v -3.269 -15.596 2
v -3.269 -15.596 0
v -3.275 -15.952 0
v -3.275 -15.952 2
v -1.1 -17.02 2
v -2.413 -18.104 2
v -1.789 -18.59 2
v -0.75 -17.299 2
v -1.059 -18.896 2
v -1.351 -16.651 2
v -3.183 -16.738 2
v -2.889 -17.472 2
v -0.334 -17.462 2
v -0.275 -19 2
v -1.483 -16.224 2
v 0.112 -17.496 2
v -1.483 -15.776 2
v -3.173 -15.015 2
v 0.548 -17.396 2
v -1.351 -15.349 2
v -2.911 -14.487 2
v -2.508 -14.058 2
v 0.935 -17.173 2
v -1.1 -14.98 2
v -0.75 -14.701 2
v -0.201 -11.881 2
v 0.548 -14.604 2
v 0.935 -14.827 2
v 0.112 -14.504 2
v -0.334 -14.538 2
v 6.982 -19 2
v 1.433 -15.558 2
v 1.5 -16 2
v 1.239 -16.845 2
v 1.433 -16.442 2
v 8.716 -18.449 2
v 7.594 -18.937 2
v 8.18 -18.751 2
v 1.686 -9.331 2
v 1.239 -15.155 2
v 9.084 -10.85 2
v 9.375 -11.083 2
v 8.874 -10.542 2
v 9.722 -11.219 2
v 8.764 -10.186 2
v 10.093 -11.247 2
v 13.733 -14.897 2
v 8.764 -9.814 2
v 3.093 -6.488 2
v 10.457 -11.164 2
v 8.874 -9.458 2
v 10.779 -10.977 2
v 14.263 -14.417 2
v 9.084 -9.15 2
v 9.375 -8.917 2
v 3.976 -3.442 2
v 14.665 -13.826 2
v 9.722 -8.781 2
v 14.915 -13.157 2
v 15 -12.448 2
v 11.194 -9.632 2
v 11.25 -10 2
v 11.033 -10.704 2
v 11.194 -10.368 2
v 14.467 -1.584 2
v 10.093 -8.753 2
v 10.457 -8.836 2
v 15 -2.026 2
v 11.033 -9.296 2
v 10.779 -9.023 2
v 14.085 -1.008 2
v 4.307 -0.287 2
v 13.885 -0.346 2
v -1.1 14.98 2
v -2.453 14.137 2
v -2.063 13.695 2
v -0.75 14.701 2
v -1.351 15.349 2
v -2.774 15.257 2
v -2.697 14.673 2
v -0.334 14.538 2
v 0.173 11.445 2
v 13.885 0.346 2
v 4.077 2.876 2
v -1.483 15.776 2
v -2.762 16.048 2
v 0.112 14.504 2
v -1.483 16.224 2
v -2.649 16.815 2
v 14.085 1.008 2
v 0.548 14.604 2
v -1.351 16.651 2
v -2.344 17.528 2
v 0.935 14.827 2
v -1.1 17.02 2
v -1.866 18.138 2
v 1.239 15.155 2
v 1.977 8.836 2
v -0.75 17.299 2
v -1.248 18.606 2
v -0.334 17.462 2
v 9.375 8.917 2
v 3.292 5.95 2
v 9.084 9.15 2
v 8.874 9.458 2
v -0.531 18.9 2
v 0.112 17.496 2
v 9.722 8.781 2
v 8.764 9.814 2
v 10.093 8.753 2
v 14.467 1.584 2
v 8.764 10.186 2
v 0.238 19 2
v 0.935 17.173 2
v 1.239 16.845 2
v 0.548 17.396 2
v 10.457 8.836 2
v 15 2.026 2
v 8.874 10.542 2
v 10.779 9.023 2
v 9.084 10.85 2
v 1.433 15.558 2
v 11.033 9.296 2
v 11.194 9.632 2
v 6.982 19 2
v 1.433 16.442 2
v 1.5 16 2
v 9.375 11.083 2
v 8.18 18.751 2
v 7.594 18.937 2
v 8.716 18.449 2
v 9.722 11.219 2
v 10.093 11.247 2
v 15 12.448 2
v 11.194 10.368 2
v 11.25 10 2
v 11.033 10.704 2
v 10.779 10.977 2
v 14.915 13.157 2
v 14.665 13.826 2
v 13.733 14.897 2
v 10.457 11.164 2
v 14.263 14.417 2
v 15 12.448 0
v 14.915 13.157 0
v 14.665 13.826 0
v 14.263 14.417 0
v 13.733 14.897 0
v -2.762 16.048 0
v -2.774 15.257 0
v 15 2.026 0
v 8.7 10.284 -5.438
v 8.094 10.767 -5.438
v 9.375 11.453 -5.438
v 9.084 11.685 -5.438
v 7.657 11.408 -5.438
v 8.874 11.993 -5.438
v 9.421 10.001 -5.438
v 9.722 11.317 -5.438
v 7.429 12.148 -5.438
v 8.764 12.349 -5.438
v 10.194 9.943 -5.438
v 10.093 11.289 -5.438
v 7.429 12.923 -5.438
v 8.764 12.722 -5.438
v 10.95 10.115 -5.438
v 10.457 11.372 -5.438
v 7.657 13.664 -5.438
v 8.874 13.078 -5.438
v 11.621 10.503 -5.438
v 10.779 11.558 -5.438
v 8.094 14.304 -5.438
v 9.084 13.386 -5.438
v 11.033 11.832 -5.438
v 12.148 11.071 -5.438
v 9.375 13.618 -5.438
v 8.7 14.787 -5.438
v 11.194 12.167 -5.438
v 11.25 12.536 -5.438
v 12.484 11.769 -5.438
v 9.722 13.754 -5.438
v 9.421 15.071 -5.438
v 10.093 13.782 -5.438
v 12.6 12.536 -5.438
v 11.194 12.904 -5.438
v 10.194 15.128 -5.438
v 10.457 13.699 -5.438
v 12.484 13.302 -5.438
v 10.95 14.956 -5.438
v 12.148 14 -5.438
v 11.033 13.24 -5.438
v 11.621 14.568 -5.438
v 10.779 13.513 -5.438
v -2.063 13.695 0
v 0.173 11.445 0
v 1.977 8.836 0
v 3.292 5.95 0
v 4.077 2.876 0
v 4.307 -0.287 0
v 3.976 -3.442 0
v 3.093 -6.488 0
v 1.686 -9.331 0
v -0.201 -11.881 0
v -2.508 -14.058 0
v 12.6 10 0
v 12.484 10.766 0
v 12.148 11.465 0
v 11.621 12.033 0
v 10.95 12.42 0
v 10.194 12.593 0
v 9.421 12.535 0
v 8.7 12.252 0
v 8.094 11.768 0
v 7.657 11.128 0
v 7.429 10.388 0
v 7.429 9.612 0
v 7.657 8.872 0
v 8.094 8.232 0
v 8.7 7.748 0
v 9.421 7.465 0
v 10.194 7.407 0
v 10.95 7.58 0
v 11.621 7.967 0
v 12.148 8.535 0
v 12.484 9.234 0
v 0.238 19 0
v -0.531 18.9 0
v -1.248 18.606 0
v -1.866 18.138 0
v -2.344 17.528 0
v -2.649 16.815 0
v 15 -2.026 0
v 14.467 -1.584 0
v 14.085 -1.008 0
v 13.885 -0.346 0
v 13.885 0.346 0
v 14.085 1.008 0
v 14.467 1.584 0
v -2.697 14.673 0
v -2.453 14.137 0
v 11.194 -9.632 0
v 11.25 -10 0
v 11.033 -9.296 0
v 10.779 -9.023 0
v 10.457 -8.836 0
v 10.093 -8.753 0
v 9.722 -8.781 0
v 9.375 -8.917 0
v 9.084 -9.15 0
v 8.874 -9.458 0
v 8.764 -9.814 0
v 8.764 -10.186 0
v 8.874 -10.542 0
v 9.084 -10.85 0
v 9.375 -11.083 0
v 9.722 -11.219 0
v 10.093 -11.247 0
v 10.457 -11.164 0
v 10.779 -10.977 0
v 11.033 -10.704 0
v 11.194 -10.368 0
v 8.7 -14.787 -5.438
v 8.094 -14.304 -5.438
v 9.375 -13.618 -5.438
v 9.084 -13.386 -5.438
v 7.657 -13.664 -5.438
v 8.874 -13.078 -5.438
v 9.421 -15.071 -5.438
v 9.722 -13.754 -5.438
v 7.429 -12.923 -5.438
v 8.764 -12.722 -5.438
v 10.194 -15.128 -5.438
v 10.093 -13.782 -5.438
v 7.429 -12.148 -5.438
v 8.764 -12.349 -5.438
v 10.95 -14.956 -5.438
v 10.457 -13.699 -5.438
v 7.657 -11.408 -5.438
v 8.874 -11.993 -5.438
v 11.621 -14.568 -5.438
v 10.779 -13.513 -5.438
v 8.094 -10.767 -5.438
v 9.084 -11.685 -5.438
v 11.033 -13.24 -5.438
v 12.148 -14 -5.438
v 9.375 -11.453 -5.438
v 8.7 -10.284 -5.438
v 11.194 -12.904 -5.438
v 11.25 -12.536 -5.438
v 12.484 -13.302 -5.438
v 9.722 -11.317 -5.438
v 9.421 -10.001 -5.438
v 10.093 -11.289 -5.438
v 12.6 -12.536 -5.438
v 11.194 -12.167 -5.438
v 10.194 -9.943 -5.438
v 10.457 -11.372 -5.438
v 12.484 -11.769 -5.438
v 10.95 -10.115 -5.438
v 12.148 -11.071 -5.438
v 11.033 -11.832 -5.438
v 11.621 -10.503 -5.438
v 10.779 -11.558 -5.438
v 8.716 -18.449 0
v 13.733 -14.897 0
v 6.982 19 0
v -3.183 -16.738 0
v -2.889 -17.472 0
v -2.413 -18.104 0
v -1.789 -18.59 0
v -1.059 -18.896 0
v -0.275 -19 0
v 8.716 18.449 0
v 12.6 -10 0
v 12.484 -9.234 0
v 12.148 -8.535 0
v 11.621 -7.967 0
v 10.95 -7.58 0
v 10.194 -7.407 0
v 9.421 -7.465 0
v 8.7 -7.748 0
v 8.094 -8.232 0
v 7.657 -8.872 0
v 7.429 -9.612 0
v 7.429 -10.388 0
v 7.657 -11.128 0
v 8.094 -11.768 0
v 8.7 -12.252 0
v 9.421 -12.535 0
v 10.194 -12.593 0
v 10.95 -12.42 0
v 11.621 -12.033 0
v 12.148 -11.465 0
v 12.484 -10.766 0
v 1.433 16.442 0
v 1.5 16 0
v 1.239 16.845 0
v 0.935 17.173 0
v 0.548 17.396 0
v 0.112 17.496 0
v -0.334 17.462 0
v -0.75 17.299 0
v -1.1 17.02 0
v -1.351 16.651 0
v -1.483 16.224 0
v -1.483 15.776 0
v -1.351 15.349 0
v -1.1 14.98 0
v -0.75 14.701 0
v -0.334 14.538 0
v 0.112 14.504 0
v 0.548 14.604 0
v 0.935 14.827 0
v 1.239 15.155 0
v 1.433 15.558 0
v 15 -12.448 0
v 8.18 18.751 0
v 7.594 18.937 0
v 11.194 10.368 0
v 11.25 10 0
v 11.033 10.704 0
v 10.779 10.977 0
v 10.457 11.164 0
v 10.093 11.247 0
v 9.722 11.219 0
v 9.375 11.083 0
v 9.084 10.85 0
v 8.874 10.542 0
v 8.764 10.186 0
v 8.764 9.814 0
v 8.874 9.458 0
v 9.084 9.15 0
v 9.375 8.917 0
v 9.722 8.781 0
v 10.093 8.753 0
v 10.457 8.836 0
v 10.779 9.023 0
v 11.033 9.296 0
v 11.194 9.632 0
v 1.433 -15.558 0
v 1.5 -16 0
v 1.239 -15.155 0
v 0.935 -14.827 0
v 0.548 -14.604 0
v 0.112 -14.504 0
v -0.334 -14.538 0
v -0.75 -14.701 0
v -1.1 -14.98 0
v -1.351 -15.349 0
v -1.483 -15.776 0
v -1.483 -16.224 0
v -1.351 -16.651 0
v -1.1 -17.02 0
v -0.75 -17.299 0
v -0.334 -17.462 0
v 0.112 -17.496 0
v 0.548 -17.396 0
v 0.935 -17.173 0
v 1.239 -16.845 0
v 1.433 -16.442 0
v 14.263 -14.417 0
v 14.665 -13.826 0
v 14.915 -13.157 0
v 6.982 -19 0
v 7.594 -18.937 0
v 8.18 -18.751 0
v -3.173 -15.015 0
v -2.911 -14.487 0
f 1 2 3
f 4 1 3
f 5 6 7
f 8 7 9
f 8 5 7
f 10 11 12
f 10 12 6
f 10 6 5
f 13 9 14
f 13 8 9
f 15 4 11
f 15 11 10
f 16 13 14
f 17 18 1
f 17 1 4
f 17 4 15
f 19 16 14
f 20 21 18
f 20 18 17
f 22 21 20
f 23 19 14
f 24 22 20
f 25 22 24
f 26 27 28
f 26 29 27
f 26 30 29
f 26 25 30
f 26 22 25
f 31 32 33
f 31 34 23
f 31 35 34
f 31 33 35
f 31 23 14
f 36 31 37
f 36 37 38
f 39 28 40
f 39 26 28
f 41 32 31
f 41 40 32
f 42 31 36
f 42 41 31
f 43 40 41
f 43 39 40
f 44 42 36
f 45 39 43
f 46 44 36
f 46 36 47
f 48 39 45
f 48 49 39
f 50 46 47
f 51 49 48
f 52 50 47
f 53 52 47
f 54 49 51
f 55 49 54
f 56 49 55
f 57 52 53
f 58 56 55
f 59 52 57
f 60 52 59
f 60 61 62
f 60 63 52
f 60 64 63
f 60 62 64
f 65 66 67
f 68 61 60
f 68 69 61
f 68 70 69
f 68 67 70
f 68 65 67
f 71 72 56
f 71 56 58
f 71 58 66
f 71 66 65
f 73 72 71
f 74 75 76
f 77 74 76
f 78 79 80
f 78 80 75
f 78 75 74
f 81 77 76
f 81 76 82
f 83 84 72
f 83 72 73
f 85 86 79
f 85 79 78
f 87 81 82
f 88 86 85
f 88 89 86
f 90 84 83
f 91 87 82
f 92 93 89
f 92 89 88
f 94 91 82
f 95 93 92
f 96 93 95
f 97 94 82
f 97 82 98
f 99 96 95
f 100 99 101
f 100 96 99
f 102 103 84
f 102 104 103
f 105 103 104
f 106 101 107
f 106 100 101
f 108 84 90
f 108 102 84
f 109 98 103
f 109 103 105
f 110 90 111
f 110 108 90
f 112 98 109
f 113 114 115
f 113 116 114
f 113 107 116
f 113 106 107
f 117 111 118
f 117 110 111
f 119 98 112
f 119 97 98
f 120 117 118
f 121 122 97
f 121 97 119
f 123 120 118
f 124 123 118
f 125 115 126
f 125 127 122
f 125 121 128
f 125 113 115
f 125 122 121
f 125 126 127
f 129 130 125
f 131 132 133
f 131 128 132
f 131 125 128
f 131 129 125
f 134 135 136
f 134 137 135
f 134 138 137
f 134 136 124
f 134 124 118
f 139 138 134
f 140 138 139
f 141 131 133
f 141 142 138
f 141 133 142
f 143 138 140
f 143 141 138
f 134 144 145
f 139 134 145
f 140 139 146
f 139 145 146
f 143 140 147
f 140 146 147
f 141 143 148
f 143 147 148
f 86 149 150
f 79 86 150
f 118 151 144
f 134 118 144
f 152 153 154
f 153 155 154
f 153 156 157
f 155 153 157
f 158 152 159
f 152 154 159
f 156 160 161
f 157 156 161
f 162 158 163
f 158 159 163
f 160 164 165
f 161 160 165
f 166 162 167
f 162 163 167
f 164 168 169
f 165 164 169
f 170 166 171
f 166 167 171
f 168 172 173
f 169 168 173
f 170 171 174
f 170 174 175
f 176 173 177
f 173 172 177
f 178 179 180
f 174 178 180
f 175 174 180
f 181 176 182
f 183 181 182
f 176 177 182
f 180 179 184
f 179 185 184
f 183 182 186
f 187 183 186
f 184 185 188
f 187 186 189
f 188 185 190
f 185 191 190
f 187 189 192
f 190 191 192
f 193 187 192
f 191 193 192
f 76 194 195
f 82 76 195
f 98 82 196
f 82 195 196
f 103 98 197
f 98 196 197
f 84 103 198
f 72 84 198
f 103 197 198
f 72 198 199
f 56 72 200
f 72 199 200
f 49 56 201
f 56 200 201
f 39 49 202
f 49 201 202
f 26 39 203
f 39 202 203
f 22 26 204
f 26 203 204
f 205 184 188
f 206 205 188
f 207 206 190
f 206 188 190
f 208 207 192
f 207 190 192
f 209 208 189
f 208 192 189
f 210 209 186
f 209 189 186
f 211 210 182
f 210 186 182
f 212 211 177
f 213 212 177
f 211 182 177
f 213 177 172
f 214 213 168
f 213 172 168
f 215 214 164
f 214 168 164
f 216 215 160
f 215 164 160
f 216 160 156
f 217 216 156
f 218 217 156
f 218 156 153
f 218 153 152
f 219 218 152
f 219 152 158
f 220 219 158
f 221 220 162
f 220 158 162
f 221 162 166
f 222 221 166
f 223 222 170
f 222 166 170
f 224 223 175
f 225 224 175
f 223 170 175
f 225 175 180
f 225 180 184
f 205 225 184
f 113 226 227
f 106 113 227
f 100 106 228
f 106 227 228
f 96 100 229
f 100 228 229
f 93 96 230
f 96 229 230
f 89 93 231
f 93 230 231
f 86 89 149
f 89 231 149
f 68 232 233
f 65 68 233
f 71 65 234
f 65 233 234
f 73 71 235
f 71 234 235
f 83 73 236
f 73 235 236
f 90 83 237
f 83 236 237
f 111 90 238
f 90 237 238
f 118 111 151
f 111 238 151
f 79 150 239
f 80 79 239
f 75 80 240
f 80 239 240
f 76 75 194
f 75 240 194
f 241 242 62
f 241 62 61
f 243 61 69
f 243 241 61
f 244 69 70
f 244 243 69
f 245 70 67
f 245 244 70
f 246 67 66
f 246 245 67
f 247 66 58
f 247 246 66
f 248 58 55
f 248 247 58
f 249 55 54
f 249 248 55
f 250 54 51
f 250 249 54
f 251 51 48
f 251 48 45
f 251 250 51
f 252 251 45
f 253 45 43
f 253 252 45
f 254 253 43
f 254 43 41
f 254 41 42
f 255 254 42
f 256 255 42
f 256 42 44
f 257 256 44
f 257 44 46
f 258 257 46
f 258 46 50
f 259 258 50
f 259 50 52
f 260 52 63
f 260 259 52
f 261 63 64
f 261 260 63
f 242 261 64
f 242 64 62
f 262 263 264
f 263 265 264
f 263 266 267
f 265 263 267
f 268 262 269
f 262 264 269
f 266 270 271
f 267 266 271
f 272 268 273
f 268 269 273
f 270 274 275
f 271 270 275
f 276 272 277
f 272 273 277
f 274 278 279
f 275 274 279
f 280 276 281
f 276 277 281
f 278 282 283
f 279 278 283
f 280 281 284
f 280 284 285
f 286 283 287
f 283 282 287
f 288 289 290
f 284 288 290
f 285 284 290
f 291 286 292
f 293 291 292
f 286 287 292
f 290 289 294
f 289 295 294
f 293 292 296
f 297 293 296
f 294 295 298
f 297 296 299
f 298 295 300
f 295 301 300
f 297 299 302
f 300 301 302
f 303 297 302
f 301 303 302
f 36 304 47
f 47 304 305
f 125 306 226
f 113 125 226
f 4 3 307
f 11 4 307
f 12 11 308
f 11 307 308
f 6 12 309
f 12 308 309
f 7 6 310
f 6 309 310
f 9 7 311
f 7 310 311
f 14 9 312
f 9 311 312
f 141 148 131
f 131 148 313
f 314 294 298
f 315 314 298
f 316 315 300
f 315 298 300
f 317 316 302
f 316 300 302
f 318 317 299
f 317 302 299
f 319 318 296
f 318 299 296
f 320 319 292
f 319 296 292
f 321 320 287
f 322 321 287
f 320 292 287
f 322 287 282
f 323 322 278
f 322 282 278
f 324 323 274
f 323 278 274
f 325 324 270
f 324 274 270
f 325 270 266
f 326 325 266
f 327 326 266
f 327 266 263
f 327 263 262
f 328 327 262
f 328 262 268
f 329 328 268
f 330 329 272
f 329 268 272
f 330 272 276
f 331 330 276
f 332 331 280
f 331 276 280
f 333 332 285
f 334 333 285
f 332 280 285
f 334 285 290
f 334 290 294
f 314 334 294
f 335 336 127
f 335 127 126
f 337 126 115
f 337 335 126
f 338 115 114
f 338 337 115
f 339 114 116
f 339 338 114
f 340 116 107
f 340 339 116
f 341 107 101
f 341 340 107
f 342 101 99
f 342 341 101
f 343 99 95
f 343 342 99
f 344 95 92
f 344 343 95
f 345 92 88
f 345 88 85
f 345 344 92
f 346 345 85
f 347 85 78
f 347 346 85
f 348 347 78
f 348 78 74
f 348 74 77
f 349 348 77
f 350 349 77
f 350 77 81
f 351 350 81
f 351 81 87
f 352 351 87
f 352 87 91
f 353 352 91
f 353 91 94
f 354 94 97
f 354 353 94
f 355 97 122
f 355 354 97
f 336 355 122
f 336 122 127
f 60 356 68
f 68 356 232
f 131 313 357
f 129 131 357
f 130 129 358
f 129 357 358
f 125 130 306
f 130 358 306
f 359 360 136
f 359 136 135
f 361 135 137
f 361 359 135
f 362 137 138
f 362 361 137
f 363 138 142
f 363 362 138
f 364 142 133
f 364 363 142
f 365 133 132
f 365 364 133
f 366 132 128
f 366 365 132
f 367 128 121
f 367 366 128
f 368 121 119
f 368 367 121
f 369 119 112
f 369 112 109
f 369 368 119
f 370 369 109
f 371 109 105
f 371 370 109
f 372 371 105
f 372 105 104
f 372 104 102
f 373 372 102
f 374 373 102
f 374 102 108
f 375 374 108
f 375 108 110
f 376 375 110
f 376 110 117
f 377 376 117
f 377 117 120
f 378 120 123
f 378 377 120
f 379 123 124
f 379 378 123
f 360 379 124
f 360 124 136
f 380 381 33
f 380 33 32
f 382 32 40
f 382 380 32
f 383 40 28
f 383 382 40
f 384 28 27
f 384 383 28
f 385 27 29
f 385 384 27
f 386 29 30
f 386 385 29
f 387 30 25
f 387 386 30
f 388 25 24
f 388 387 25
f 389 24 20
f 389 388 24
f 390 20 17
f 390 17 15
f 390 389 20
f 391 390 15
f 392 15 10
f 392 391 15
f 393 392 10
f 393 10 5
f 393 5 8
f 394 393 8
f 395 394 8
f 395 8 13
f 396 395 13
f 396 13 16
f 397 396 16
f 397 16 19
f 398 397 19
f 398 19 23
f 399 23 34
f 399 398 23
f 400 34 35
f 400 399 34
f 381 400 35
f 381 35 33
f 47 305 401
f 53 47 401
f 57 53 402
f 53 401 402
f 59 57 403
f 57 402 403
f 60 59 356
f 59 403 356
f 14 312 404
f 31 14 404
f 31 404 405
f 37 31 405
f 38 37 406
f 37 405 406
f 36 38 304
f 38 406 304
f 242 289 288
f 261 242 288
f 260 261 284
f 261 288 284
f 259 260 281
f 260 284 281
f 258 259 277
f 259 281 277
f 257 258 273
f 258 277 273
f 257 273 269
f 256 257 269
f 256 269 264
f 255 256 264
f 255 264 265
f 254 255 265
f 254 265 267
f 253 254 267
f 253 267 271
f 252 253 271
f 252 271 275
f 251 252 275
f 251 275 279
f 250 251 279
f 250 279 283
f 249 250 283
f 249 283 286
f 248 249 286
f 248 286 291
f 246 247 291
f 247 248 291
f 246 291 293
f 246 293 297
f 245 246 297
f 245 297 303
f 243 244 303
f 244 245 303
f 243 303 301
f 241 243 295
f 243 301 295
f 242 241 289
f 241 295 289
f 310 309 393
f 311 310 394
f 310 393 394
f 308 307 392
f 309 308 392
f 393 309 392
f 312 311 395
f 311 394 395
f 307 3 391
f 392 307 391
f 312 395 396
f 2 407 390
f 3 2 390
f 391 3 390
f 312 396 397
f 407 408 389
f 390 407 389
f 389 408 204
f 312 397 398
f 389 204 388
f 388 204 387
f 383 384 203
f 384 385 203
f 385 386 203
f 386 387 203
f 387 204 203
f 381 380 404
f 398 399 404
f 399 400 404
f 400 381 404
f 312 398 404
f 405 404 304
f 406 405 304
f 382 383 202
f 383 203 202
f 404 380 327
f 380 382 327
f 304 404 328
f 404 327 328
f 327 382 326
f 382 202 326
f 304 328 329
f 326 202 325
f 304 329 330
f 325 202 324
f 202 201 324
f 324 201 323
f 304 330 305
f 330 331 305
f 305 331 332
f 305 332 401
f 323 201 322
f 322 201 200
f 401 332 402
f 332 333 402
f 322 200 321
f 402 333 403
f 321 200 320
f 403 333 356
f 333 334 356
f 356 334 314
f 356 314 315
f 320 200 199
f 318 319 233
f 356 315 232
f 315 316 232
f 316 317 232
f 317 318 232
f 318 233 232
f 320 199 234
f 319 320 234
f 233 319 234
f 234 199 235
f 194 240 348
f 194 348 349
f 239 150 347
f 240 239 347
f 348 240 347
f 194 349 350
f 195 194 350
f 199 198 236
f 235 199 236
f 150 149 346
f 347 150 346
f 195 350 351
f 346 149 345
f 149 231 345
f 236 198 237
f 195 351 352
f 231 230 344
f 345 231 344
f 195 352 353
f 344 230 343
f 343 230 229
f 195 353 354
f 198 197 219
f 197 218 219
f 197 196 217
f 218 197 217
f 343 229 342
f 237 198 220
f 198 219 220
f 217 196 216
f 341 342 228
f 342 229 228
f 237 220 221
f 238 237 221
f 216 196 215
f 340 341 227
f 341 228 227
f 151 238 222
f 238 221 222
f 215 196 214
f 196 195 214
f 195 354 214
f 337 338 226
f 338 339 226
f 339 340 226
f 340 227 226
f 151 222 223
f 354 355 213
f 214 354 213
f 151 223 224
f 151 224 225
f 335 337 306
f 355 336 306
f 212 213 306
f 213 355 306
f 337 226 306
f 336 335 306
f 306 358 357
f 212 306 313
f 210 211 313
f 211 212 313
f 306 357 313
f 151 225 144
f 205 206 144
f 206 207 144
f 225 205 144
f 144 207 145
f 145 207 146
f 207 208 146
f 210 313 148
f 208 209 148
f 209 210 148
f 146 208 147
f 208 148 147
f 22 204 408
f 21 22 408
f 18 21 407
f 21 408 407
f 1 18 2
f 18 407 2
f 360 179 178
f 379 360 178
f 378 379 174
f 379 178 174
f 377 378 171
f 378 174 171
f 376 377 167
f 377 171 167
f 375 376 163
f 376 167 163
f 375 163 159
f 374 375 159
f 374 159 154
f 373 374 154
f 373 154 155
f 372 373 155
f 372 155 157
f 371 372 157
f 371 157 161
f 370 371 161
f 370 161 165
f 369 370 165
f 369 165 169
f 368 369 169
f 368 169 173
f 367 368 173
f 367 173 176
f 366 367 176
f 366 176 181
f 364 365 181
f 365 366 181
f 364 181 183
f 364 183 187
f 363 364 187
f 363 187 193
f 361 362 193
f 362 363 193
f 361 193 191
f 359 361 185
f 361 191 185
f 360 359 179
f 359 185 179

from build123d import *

# Parameters (mm, degrees)
F0_R     = 1.5
F0_R_2   = 2.6
F0_R_3   = 1.25
F1_DEPTH = 2


with BuildPart() as f1:
    # F0 (on Top) → F1 (new body)
    with BuildSketch(Plane.XY):
        with BuildLine():
            ThreePointArc((13.733325, -14.896663), (14.66458, -13.826485), (15, -12.448075))
            Line((15, -12.448075), (15, -2.025536))
            ThreePointArc((15, -2.025536), (13.859575, 0), (15, 2.025536))
            Line((15, 2.025536), (15, 12.448075))
            ThreePointArc((15, 12.448075), (14.66458, 13.826485), (13.733325, 14.896663))
            Line((13.733325, 14.896663), (8.715685, 18.448588))
            ThreePointArc((8.715685, 18.448588), (7.89182, 18.858825), (6.98236, 19))
            Line((6.98236, 19), (0.238068, 19))
            ThreePointArc((0.238068, 19), (-1.866179, 18.138258), (-2.761547, 16.048099))
            Line((-2.761547, 16.048099), (-2.774231, 15.257063))
            ThreePointArc((-2.774231, 15.257063), (-2.594506, 14.395821), (-2.062591, 13.695032))
            ThreePointArc((-2.062591, 13.695032), (4.30745, -0.287028), (-2.507604, -14.057665))
            ThreePointArc((-2.507604, -14.057665), (-3.061715, -14.741039), (-3.26896, -15.596076))
            Line((-3.26896, -15.596076), (-3.274666, -15.951901))
            ThreePointArc((-3.274666, -15.951901), (-2.41331, -18.104246), (-0.275051, -19))
            Line((-0.275051, -19), (6.98236, -19))
            ThreePointArc((6.98236, -19), (7.89182, -18.858825), (8.715685, -18.448588))
            Line((8.715685, -18.448588), (13.733325, -14.896663))
        make_face()
        with Locations((0, -16)):
            Circle(F0_R, mode=Mode.SUBTRACT)
        with Locations((10, -10)):
            Circle(F0_R_2, mode=Mode.SUBTRACT)
        with Locations((0, 16)):
            Circle(F0_R, mode=Mode.SUBTRACT)
        with Locations((10, 10)):
            Circle(F0_R_2, mode=Mode.SUBTRACT)
        with Locations((10, -10)):
            Circle(F0_R_2)
        with Locations((10, -10)):
            Circle(F0_R_3, mode=Mode.SUBTRACT)
        with Locations((10, 10)):
            Circle(F0_R_2)
        with Locations((10, 10)):
            Circle(F0_R_3, mode=Mode.SUBTRACT)
    extrude(amount=F1_DEPTH)

    # F4: sweep along a path in F3
    with BuildLine(Plane.YZ.offset(10)) as f4_path:
        Line((-7.331403, 0), (-9.867113, -5.437847))
    # F0 (on Top) → F4 (sweep)
    with BuildSketch(Plane.XY):
        with Locations((10, -10)):
            Circle(F0_R_2)
        with Locations((10, -10)):
            Circle(F0_R_3, mode=Mode.SUBTRACT)
    sweep(path=f4_path.line)

    # F5: sweep along a path in F3
    with BuildLine(Plane.YZ.offset(10)) as f5_path:
        Line((7.409177, 0), (9.944887, -5.437847))
    # F0 (on Top) → F5 (sweep)
    with BuildSketch(Plane.XY):
        with Locations((10, 10)):
            Circle(F0_R_2)
        with Locations((10, 10)):
            Circle(F0_R_3, mode=Mode.SUBTRACT)
    sweep(path=f5_path.line)


solid = f1.part
